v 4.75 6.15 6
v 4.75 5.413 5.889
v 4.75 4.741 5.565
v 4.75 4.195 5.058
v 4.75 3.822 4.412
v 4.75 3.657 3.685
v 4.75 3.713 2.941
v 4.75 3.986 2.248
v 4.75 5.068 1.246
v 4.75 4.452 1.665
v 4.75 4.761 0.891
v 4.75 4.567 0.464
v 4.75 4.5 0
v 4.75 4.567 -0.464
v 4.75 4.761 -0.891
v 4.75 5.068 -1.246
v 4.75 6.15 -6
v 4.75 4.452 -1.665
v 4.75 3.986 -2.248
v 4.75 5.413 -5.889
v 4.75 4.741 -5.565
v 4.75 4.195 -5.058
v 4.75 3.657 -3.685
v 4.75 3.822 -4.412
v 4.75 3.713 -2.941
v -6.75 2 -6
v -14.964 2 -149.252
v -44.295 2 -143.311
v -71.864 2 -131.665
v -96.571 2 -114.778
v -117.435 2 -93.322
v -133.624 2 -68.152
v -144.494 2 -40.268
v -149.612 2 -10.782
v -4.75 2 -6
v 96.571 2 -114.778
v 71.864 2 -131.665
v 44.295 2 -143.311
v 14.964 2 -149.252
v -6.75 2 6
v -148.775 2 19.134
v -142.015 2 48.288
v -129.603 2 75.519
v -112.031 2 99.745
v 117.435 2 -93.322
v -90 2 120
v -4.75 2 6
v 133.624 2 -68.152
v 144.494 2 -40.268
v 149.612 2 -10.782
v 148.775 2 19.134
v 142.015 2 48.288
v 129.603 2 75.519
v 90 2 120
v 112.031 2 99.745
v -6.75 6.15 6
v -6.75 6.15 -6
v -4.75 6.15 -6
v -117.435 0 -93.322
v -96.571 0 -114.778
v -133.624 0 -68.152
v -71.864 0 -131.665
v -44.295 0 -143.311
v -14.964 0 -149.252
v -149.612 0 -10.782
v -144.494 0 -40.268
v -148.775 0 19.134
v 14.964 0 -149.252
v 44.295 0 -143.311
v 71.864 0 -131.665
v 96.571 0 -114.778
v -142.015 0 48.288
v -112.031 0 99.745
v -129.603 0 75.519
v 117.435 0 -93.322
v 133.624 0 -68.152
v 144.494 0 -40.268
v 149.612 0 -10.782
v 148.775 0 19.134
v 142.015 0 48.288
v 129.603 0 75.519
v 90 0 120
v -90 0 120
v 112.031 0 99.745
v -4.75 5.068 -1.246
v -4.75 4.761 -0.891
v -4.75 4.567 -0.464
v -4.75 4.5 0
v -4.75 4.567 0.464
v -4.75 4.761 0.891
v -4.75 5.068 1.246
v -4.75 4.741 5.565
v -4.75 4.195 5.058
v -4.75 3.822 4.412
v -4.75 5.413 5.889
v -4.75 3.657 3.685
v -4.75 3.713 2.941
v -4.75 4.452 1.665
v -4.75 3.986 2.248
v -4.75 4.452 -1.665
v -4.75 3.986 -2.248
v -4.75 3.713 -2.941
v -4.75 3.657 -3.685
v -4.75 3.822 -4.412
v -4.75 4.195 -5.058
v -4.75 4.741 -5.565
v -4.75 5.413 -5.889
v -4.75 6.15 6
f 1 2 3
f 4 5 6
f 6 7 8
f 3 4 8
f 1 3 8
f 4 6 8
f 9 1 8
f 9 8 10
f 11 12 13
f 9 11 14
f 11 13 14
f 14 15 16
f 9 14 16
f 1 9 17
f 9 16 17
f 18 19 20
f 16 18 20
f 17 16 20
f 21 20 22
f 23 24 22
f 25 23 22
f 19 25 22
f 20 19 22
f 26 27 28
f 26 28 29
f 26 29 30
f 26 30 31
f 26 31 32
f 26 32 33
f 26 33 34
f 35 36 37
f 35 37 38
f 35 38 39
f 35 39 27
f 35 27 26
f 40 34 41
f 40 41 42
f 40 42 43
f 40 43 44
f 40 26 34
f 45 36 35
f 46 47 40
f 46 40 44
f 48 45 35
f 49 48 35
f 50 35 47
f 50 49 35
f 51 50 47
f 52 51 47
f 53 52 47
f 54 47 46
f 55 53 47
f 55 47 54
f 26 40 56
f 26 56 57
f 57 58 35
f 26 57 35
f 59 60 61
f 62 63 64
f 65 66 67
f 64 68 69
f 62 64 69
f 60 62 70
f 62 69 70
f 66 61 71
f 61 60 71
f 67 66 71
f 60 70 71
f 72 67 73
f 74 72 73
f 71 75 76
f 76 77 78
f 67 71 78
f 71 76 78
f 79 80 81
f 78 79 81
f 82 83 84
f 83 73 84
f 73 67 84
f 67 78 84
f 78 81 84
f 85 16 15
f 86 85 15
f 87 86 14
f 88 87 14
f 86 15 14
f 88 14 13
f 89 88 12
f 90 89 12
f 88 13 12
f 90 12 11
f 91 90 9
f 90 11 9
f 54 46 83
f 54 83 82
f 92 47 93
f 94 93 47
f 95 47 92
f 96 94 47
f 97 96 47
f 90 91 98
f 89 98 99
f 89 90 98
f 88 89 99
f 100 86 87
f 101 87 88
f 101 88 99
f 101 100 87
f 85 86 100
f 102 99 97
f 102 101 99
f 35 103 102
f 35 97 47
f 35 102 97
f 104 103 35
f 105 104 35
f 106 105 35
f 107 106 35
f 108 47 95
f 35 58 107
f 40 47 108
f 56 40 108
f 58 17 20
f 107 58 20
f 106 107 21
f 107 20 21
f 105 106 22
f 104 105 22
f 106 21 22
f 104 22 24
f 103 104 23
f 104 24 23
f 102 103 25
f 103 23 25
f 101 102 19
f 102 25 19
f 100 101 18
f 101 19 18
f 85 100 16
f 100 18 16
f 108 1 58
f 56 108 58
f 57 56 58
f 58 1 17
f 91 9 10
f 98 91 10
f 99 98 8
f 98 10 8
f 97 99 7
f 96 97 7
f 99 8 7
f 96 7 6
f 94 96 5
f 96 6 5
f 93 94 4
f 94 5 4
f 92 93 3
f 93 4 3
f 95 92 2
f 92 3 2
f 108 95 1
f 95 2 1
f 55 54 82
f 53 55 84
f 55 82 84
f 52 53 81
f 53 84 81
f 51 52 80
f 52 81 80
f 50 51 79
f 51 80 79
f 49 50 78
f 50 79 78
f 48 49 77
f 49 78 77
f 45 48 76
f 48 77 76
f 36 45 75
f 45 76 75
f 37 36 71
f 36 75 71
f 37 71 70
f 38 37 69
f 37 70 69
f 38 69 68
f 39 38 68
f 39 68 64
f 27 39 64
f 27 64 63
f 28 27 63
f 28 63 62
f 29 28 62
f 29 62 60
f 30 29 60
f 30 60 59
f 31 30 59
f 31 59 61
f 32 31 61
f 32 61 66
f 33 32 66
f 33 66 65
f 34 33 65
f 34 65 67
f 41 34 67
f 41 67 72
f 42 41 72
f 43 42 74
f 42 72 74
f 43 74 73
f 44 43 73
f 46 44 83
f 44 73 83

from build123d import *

# Parameters (mm, degrees)
ESQUISSE1_R             = 150
BOSS_EXTRU_1_DEPTH      = 2
ESQUISSE2_W             = 11.5
ESQUISSE2_H             = 13.5
BOSS_EXTRU_2_DEPTH      = 7
ENL_V_MAT_EXTRU_2_DEPTH = 30
ENL_V_MAT_EXTRU_3_DEPTH = 9.5
ENL_V_MAT_EXTRU_4_DEPTH = 213.172624294


with BuildPart() as part:
    # Esquisse1 → Boss.-Extru.1 (new body)
    with BuildSketch(Plane(origin=(0, 0, 0), x_dir=(1, 0, 0), z_dir=(0, 1, 0))):
        Circle(ESQUISSE1_R)
    extrude(amount=BOSS_EXTRU_1_DEPTH)

    # Esquisse2 → Boss.-Extru.2 (add)
    with BuildSketch(Plane(origin=(0, 2, 0), x_dir=(1, 0, 0), z_dir=(0, 1, 0))):
        with Locations((-1, 0)):
            Rectangle(ESQUISSE2_W, ESQUISSE2_H)
    extrude(amount=BOSS_EXTRU_2_DEPTH)

    # Esquisse3 → Enlèv. mat.-Extru.2 (cut)
    with BuildSketch(Plane(origin=(4.75, 0, 0), x_dir=(0, 0, -1), z_dir=(1, 0, 0))):
        Polygon((-6, 2), (-6, 6.15), (-1.65, 6.15), (1.65, 6.15), (6, 6.15), (6, 2), (6.75, 2), (6.75, 9), (-6.75, 9), (-6.75, 2), align=None)
    extrude(amount=-ENL_V_MAT_EXTRU_2_DEPTH, mode=Mode.SUBTRACT)

    # Esquisse3<3> → Enlèv. mat.-Extru.3 (cut)
    with BuildSketch(Plane(origin=(4.75, 0, 0), x_dir=(0, 0, -1), z_dir=(1, 0, 0))):
        with BuildLine():
            ThreePointArc((-1.246071429, 5.0684243), (-4.054607326, 3.712293965), (-6, 6.15))
            Line((-6, 6.15), (-6, 2))
            Line((-6, 2), (6, 2))
            Line((6, 2), (6, 6.15))
            ThreePointArc((6, 6.15), (4.054607326, 3.712293965), (1.246071429, 5.0684243))
            ThreePointArc((1.246071429, 5.0684243), (0, 4.5), (-1.246071429, 5.0684243))
        make_face()
    extrude(amount=-ENL_V_MAT_EXTRU_3_DEPTH, mode=Mode.SUBTRACT)

    # Esquisse4 → Enlèv. mat.-Extru.4 (cut, through all)
    with BuildSketch(Plane(origin=(0, 2, 0), x_dir=(1, 0, 0), z_dir=(0, 1, 0))):
        with BuildLine():
            Line((-90, -120), (90, -120))
            ThreePointArc((90, -120), (0, -150), (-90, -120))
        make_face()
    extrude(amount=-ENL_V_MAT_EXTRU_4_DEPTH, mode=Mode.SUBTRACT)


solid = part.part
